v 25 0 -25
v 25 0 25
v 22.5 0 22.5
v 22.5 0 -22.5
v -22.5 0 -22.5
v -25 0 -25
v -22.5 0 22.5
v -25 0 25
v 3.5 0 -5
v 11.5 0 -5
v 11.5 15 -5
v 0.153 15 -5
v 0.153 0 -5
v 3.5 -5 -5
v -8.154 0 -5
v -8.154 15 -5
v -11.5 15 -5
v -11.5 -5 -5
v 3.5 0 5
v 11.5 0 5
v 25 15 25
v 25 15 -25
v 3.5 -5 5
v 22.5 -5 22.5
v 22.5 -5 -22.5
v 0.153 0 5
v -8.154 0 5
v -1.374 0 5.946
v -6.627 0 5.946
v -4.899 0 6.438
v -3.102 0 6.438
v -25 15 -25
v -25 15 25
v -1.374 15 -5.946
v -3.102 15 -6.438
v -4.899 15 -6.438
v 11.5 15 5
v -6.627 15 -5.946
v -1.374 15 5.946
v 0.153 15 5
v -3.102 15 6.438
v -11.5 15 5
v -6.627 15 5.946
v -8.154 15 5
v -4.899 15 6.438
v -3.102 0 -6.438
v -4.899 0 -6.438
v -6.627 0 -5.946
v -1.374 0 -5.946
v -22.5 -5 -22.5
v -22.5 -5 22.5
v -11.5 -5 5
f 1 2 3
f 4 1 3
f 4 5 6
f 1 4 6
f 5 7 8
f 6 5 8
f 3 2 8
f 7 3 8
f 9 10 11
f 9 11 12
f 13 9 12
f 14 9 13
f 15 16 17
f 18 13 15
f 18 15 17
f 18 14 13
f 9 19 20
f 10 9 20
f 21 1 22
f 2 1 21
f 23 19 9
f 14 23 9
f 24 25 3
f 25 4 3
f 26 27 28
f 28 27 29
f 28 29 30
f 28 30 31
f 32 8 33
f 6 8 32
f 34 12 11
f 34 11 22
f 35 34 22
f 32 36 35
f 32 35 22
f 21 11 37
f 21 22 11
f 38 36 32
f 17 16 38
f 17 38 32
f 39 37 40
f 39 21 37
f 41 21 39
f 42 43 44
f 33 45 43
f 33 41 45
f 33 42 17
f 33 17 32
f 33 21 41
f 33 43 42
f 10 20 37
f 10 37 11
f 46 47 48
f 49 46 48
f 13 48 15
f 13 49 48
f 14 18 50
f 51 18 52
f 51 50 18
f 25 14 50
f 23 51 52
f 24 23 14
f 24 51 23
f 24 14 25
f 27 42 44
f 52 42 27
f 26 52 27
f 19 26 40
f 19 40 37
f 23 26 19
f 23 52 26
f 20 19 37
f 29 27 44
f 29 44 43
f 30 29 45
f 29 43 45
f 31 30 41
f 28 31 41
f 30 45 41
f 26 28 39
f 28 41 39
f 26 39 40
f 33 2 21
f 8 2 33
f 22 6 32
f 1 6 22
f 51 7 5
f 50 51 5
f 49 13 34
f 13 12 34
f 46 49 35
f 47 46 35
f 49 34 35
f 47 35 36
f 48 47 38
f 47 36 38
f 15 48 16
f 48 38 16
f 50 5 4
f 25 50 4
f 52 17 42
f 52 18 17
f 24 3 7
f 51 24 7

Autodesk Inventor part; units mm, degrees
ref_plane "YZ Plane" through (0, 0, 0) normal (1, 0, 0) x (0, 1, 0)
ref_plane "XZ Plane" through (0, 0, 0) normal (0, 1, 0) x (-1, 0, 0)
ref_plane "XY Plane" through (0, 0, 0) normal (0, 0, 1) x (1, 0, 0)
sketch "Эскиз1" plane through (0, 0, 0) normal (0, 1, 0) x (-1, 0, 0)
  line L0 (-25, 25) -> (25, 25)
  line L1 (25, 25) -> (25, -25)
  line L2 (25, -25) -> (-25, -25)
  line L3 (-25, -25) -> (-25, 25)
  line L4 (-25, 25) -> (25, -25) construction
  line L5 (25, 25) -> (-25, -25) construction
  line L6 (-11.5, -5) -> (11.5, -5)
  line L7 (11.5, -5) -> (11.5, 5)
  line L8 (11.5, 5) -> (-11.5, 5)
  line L9 (-11.5, 5) -> (-11.5, -5)
  line L10 (-11.5, -5) -> (11.5, 5) construction
  line L11 (11.5, -5) -> (-11.5, 5) construction
  line L12 (-3.5, 5) -> (-3.5, -5)
  line L13 (4, 5) -> (4, -5) construction
  circle A0 centre (4, 0) radius 5
  point P0 (0, 0)
  point P1 (4, -5)
  point P2 (4, 5)
  dimension "d0" = 50
  dimension "d1" = 50
  dimension "d2" = 23
  dimension "d3" = 10
  dimension "d4" = 8
  dimension "d29" = 7.5
  dimension "d30" = 10
extrude "Выдавливание13" add sketch "Эскиз1" along normal blind 15
sketch "Эскиз6" plane through (0, 0, 0) normal (0, -1, 0) x (1, 0, 0)
  line L0 (22.5, 22.5) -> (-22.5, 22.5)
  line L1 (-22.5, 22.5) -> (-22.5, -22.5)
  line L2 (-22.5, -22.5) -> (22.5, -22.5)
  line L3 (22.5, -22.5) -> (22.5, 22.5)
  line L4 (22.5, 22.5) -> (-22.5, -22.5) construction
  line L5 (-22.5, 22.5) -> (22.5, -22.5) construction
  point P0 (0, 0)
  dimension "d41" = 45
  dimension "d42" = 45
extrude "Выдавливание14" add sketch "Эскиз6" along normal blind 5
extrude "Выдавливание15" cut sketch "Эскиз1" against normal through all contours L12 L8 A0 L6 | A0 L8 L7 L6 | A0
sketch "Эскиз7" plane through (0, 15, 0) normal (0, 1, 0) x (1, 0, 0)
  circle A0 centre (-4.0005, 0) radius 6.5
  line L0 (25, 25) -> (-25, 25) projected
  line L1 (-25, 25) -> (-25, -25) projected
  point P0 (0, 0)
  dimension "d47" = 13
  dimension "d48" = 25
  dimension "d49" = 20.9995
extrude "Выдавливание16" cut sketch "Эскиз7" against normal blind 15
properties part number "platform"
